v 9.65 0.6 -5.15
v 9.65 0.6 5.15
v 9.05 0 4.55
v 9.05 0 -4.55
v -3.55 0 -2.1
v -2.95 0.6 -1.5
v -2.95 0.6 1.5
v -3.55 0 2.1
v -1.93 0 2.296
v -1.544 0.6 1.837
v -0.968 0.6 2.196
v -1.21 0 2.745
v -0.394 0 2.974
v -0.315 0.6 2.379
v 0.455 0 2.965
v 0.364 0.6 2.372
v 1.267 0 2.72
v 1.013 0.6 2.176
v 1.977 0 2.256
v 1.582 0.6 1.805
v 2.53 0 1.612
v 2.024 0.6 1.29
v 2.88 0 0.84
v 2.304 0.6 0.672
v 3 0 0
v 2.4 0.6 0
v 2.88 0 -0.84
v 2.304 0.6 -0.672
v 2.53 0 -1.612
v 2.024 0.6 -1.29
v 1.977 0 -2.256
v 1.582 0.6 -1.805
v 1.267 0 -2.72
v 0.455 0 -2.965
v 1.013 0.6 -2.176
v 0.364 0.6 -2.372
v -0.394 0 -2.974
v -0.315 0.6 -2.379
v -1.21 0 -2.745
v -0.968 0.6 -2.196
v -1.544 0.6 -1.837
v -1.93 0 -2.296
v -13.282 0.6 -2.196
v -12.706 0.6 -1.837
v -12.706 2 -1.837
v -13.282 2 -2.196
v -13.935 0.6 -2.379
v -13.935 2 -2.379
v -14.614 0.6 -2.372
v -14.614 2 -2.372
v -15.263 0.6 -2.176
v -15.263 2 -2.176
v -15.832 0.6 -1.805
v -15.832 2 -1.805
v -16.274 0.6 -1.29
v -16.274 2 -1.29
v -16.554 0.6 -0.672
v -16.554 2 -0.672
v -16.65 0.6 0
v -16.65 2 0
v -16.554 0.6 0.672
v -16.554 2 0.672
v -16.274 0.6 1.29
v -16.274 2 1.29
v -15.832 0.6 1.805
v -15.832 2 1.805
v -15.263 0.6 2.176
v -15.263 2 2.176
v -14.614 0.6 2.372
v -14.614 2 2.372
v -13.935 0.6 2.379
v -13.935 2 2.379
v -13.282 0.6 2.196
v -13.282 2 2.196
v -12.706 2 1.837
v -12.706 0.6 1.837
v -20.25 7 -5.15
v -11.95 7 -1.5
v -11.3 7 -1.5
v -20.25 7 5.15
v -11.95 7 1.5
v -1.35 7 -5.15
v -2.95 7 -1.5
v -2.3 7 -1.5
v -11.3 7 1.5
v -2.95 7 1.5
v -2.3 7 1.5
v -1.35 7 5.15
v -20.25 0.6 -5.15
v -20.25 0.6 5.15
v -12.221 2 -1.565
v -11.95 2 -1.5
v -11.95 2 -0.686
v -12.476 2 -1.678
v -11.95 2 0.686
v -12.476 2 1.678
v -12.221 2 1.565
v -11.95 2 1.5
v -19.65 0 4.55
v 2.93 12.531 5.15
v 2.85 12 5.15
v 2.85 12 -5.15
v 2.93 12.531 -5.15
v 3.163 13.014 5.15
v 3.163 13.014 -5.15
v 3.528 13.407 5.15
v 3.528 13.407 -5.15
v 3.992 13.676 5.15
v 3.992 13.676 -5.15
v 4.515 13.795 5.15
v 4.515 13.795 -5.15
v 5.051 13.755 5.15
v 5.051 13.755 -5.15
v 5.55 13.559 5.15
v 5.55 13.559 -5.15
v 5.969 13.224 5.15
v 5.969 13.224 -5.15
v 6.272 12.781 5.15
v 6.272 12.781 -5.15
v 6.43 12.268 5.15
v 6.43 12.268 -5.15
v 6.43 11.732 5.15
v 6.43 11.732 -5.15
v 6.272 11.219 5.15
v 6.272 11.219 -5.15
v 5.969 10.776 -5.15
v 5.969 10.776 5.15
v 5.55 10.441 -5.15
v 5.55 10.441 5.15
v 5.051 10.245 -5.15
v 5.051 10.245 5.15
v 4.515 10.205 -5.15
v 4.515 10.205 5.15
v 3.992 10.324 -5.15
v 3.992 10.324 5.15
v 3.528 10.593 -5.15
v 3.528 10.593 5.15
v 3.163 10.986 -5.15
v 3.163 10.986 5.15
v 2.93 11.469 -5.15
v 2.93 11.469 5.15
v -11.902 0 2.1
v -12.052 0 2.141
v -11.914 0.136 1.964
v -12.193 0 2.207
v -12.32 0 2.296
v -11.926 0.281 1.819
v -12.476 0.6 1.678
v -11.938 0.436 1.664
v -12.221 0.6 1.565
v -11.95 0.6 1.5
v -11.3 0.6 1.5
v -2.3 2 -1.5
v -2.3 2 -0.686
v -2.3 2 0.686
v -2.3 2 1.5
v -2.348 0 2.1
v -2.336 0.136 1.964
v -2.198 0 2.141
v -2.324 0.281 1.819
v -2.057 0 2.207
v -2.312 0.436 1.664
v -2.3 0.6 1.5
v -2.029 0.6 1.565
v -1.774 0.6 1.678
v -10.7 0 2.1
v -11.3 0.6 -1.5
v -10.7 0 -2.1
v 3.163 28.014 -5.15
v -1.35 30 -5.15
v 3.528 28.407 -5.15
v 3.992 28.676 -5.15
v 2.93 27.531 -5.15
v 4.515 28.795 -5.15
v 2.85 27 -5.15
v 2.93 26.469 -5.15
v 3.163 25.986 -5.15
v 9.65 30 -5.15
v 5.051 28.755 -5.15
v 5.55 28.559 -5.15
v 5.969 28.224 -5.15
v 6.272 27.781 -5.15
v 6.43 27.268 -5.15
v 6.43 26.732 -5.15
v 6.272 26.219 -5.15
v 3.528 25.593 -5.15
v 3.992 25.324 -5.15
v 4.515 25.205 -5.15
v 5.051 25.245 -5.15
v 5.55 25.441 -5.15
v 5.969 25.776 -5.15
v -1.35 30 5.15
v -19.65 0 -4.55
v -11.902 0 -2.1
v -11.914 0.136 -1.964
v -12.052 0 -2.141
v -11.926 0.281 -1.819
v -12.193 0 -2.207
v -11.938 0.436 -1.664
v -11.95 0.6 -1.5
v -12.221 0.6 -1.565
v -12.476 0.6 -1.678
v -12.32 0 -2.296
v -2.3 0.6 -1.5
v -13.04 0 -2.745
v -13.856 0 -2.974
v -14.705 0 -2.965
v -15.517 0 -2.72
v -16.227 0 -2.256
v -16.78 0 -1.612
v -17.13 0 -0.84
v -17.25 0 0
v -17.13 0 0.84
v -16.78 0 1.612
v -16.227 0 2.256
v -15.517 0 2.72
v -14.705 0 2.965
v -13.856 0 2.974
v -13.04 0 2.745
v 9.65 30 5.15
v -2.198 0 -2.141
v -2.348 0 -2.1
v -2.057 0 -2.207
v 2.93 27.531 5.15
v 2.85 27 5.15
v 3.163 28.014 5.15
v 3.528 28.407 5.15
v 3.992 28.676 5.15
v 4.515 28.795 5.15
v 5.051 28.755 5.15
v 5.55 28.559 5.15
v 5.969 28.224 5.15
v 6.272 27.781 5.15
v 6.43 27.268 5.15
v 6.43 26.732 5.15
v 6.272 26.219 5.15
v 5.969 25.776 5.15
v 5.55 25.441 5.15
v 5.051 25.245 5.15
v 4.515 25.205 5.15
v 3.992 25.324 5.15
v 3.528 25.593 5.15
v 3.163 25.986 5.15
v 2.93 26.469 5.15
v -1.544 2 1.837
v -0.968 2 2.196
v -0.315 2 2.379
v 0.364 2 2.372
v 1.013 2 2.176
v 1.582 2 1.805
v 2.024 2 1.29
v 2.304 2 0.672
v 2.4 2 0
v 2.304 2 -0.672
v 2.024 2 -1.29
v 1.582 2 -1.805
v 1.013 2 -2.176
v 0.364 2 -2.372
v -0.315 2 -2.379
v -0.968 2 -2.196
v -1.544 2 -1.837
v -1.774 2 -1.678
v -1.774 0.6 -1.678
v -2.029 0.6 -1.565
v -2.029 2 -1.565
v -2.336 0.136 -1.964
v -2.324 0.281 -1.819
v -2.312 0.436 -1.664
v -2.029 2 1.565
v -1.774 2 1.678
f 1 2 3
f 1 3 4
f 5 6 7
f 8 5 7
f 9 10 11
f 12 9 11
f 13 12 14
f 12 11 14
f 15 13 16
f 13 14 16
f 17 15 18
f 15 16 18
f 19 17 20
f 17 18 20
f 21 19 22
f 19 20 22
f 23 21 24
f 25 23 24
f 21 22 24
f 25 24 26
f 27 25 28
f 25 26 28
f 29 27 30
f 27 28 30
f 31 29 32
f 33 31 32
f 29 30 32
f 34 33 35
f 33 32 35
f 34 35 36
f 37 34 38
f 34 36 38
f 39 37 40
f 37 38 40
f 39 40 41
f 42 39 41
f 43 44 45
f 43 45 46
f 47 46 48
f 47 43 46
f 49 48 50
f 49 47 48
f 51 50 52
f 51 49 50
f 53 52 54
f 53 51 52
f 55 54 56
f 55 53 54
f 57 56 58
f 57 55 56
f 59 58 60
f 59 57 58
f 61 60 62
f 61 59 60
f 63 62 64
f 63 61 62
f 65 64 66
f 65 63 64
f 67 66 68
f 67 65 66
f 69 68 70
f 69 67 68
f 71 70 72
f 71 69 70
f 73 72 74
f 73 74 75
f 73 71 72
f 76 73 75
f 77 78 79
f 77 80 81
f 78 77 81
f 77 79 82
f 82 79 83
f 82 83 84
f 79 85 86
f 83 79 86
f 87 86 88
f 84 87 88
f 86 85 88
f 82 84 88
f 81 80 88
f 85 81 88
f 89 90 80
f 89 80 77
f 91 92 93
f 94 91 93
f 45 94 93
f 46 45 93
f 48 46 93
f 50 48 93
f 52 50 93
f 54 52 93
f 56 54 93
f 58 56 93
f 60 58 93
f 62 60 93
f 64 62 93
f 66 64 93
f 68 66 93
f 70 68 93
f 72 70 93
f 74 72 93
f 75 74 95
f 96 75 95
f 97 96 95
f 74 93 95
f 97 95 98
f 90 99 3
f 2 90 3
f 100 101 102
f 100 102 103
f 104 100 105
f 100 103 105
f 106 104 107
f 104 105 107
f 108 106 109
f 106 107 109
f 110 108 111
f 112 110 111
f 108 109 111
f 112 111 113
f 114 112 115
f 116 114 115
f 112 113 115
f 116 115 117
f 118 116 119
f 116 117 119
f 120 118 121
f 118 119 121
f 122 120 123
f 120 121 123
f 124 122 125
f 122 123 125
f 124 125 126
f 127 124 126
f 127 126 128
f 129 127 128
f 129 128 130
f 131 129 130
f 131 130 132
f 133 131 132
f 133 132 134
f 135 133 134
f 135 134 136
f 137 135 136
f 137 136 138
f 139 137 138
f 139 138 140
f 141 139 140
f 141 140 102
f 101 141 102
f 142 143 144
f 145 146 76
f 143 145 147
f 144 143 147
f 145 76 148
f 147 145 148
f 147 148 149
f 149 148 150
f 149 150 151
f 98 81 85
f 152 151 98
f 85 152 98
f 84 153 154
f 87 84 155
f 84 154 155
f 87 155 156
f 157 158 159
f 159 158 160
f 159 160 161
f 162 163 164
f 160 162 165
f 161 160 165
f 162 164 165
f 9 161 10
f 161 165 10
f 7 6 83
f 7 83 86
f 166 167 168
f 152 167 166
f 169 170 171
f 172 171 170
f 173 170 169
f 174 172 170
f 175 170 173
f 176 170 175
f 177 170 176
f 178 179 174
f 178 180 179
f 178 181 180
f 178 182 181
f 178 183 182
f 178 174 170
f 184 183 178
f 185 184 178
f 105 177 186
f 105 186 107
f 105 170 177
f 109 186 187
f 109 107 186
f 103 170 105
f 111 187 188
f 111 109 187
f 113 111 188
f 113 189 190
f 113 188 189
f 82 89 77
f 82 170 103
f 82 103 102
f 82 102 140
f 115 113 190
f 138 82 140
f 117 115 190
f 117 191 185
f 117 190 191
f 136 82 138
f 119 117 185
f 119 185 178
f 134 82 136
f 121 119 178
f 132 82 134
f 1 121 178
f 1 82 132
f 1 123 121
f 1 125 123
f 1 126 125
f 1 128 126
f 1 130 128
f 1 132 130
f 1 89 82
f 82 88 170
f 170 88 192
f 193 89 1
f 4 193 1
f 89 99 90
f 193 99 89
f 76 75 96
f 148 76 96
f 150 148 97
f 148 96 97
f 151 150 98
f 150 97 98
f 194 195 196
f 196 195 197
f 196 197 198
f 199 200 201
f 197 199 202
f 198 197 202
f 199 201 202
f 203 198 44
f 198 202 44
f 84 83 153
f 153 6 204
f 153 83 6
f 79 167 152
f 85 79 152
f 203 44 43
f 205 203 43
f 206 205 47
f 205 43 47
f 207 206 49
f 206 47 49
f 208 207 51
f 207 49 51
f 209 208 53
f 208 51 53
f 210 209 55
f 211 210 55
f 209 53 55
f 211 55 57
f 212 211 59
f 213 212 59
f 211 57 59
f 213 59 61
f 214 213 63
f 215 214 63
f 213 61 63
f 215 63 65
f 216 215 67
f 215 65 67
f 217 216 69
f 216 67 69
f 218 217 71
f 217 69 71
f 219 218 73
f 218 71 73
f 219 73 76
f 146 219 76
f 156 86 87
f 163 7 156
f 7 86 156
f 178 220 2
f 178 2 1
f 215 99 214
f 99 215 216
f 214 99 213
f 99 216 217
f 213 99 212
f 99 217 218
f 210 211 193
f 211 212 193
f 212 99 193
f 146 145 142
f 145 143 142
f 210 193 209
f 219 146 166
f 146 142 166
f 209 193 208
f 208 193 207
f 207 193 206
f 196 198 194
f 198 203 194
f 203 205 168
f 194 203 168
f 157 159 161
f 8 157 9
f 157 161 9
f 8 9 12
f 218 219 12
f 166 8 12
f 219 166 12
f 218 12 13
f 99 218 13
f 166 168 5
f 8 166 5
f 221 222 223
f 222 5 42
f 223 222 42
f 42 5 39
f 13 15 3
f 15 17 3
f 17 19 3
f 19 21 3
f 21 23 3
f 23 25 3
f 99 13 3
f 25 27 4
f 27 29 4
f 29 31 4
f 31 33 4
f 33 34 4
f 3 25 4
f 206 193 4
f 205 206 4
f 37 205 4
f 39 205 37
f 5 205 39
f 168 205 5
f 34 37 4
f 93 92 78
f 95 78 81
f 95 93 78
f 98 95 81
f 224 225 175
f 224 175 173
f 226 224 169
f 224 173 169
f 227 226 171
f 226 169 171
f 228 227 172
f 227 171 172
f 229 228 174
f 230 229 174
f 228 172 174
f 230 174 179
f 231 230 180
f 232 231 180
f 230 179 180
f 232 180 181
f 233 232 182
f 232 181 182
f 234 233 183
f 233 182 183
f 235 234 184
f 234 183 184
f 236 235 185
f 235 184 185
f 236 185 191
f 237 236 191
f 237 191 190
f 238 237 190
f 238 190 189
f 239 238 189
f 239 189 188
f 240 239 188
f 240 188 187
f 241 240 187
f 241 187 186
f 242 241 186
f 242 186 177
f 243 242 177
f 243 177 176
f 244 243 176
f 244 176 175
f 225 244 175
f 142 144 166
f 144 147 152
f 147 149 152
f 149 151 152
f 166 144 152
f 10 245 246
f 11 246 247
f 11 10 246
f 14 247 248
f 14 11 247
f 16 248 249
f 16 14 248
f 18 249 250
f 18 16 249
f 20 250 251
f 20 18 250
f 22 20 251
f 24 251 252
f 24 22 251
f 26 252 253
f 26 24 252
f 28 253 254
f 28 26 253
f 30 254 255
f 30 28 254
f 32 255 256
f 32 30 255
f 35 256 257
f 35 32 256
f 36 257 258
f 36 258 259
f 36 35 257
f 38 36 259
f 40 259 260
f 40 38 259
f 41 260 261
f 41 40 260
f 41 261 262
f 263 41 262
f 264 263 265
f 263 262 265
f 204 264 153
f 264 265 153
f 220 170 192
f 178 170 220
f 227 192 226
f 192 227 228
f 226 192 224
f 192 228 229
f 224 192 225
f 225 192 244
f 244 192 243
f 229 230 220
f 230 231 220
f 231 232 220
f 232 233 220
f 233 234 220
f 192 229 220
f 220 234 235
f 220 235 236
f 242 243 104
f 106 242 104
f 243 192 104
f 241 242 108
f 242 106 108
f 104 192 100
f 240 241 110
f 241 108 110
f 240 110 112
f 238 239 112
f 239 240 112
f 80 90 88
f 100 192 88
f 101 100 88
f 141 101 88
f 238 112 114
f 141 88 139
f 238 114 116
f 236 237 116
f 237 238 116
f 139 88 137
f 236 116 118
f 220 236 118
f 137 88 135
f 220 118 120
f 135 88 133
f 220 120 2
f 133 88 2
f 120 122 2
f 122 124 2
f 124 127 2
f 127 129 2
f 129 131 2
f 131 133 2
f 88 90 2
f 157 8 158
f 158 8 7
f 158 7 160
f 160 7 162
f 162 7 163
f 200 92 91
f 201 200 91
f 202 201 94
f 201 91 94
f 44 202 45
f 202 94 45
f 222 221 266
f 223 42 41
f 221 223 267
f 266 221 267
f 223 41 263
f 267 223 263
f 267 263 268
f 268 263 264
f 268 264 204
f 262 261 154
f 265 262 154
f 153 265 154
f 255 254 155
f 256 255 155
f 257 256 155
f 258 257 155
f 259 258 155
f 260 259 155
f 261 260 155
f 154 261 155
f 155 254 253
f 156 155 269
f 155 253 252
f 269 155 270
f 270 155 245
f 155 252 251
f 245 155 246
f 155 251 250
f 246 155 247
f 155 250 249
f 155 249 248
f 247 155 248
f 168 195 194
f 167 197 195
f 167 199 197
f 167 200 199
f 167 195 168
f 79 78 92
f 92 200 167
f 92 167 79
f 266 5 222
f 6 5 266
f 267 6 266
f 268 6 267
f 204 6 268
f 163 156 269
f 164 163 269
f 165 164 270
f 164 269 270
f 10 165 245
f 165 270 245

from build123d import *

# Parameters (mm, degrees)
SKETCH1_W            = 29.9
SKETCH1_H            = 10.3
SKETCH1_R            = 2.4
BOSS_EXTRUDE1_DEPTH  = 30
BOSS_EXTRUDE3_START  = -2
SKETCH4_W            = 29.9
SKETCH4_H            = 10.3
BOSS_EXTRUDE3_DEPTH  = 28
SKETCH2_W            = 18.9
SKETCH2_H            = 23
CUT_EXTRUDE1_DEPTH   = 38.631801711
SKETCH3_W            = 0.65
SKETCH3_H            = 3
CUT_EXTRUDE2_DEPTH   = 37.559335333
M3_CLEARANCE_HOLE1_D = 3.6
FILLET1_R            = 1.5
CHAMFER1_SIZE        = 0.6


with BuildPart() as part:
    # Sketch1 → Boss-Extrude1 (new body)
    with BuildSketch(Plane(origin=(0, 0, 0), x_dir=(1, 0, 0), z_dir=(0, 1, 0))):
        with Locations((-5.3, 0)):
            Rectangle(SKETCH1_W, SKETCH1_H)
        with Locations(Location((0, 0, 0), (0, 0, 270))):
            Circle(SKETCH1_R, mode=Mode.SUBTRACT)
        with Locations(Location((-14.25, 0, 0), (0, 0, 270))):
            Circle(SKETCH1_R, mode=Mode.SUBTRACT)
    extrude(amount=BOSS_EXTRUDE1_DEPTH)

    # Sketch4 → Boss-Extrude3 (add)
    with BuildSketch(Plane.XZ.offset(BOSS_EXTRUDE3_START)):
        with Locations((-5.3, 0)):
            Rectangle(SKETCH4_W, SKETCH4_H)
    extrude(amount=-BOSS_EXTRUDE3_DEPTH)

    # Sketch2 → Cut-Extrude1 (cut, through all)
    with BuildSketch(Plane.XY.offset(5.15)):
        with Locations((-10.8, 18.5)):
            Rectangle(SKETCH2_W, SKETCH2_H)
    extrude(amount=-CUT_EXTRUDE1_DEPTH, mode=Mode.SUBTRACT)

    # Sketch3 → Cut-Extrude2 (cut, through all)
    with BuildSketch(Plane.XZ):
        with Locations((-11.625, 0)):
            Rectangle(SKETCH3_W, SKETCH3_H)
        with Locations((-2.625, 0)):
            Rectangle(SKETCH3_W, SKETCH3_H)
    extrude(amount=-CUT_EXTRUDE2_DEPTH, mode=Mode.SUBTRACT)

    # M3 Clearance Hole1 (through all)
    with Locations(Plane.XY.offset(5.15)):
        with Locations((4.65, 12), (4.65, 27)):
            Hole(M3_CLEARANCE_HOLE1_D / 2)

    # Fillet1
    # the kernel refuses this fillet: 1.5 mm, written as the material it takes off along each edge
    with BuildSketch(Plane(origin=(-2.3, 2, 0.68556546), x_dir=(0.5486256089659476, 0, 0.8360681438655243), z_dir=(0, -1, 0)), Plane(origin=(-11.95, 2, -0.68556546), x_dir=(-0.5486256089659476, 0, -0.8360681438655244), z_dir=(0, -1, 0))) as fillet1_piece_1:
        with BuildLine():
            CenterArc((1.80773108, 1.436922187), FILLET1_R, 221.305086591, 32.01998054)
            Line((0.680922774, 0.446819645), (0, 0))
            ThreePointArc((0, 0), (0.688659459, 0.100924501), (1.377318918, 0))
        make_face()
    extrude(amount=5.443297295, mode=Mode.SUBTRACT)
    with BuildSketch(Plane(origin=(-2.3, 2, -0.68556546), x_dir=(0.5486256089659476, 0, -0.8360681438655245), z_dir=(0, -1, 0)), Plane(origin=(-11.95, 2, 0.68556546), x_dir=(-0.5486256089659488, 0, 0.8360681438655235), z_dir=(0, -1, 0))) as fillet1_piece_2:
        with BuildLine():
            CenterArc((1.80773108, -1.436922187), FILLET1_R, 106.67493287, 32.01998054)
            Line((0.680922774, -0.446819645), (0, 0))
            ThreePointArc((0, 0), (0.688659459, -0.100924501), (1.377318918, 0))
        make_face()
    extrude(amount=5.443297295, mode=Mode.SUBTRACT)

    # Chamfer1
    chamfer1_edges = [part.edges().sort_by_distance(p)[0] for p in [
        (2.4, 0, 0),
        (-16.65, 0, 0),
        (-12.351519212, 0, 1.61541677),
        (-12.351519212, 0, -1.61541677),
        (-1.898480788, 0, 1.61541677),
        (-1.898480788, 0, -1.61541677),
        (-5.3, 0, -5.15),
        (9.65, 0, 0),
        (-5.3, 0, 5.15),
        (-20.25, 0, 0),
        (-11.625, 0, -1.5),
        (-11.3, 0, 0),
        (-11.625, 0, 1.5),
        (-2.625, 0, 1.5),
        (-2.95, 0, 0),
        (-2.625, 0, -1.5),
    ]]
    chamfer(chamfer1_edges, length=CHAMFER1_SIZE)


solid = part.part
